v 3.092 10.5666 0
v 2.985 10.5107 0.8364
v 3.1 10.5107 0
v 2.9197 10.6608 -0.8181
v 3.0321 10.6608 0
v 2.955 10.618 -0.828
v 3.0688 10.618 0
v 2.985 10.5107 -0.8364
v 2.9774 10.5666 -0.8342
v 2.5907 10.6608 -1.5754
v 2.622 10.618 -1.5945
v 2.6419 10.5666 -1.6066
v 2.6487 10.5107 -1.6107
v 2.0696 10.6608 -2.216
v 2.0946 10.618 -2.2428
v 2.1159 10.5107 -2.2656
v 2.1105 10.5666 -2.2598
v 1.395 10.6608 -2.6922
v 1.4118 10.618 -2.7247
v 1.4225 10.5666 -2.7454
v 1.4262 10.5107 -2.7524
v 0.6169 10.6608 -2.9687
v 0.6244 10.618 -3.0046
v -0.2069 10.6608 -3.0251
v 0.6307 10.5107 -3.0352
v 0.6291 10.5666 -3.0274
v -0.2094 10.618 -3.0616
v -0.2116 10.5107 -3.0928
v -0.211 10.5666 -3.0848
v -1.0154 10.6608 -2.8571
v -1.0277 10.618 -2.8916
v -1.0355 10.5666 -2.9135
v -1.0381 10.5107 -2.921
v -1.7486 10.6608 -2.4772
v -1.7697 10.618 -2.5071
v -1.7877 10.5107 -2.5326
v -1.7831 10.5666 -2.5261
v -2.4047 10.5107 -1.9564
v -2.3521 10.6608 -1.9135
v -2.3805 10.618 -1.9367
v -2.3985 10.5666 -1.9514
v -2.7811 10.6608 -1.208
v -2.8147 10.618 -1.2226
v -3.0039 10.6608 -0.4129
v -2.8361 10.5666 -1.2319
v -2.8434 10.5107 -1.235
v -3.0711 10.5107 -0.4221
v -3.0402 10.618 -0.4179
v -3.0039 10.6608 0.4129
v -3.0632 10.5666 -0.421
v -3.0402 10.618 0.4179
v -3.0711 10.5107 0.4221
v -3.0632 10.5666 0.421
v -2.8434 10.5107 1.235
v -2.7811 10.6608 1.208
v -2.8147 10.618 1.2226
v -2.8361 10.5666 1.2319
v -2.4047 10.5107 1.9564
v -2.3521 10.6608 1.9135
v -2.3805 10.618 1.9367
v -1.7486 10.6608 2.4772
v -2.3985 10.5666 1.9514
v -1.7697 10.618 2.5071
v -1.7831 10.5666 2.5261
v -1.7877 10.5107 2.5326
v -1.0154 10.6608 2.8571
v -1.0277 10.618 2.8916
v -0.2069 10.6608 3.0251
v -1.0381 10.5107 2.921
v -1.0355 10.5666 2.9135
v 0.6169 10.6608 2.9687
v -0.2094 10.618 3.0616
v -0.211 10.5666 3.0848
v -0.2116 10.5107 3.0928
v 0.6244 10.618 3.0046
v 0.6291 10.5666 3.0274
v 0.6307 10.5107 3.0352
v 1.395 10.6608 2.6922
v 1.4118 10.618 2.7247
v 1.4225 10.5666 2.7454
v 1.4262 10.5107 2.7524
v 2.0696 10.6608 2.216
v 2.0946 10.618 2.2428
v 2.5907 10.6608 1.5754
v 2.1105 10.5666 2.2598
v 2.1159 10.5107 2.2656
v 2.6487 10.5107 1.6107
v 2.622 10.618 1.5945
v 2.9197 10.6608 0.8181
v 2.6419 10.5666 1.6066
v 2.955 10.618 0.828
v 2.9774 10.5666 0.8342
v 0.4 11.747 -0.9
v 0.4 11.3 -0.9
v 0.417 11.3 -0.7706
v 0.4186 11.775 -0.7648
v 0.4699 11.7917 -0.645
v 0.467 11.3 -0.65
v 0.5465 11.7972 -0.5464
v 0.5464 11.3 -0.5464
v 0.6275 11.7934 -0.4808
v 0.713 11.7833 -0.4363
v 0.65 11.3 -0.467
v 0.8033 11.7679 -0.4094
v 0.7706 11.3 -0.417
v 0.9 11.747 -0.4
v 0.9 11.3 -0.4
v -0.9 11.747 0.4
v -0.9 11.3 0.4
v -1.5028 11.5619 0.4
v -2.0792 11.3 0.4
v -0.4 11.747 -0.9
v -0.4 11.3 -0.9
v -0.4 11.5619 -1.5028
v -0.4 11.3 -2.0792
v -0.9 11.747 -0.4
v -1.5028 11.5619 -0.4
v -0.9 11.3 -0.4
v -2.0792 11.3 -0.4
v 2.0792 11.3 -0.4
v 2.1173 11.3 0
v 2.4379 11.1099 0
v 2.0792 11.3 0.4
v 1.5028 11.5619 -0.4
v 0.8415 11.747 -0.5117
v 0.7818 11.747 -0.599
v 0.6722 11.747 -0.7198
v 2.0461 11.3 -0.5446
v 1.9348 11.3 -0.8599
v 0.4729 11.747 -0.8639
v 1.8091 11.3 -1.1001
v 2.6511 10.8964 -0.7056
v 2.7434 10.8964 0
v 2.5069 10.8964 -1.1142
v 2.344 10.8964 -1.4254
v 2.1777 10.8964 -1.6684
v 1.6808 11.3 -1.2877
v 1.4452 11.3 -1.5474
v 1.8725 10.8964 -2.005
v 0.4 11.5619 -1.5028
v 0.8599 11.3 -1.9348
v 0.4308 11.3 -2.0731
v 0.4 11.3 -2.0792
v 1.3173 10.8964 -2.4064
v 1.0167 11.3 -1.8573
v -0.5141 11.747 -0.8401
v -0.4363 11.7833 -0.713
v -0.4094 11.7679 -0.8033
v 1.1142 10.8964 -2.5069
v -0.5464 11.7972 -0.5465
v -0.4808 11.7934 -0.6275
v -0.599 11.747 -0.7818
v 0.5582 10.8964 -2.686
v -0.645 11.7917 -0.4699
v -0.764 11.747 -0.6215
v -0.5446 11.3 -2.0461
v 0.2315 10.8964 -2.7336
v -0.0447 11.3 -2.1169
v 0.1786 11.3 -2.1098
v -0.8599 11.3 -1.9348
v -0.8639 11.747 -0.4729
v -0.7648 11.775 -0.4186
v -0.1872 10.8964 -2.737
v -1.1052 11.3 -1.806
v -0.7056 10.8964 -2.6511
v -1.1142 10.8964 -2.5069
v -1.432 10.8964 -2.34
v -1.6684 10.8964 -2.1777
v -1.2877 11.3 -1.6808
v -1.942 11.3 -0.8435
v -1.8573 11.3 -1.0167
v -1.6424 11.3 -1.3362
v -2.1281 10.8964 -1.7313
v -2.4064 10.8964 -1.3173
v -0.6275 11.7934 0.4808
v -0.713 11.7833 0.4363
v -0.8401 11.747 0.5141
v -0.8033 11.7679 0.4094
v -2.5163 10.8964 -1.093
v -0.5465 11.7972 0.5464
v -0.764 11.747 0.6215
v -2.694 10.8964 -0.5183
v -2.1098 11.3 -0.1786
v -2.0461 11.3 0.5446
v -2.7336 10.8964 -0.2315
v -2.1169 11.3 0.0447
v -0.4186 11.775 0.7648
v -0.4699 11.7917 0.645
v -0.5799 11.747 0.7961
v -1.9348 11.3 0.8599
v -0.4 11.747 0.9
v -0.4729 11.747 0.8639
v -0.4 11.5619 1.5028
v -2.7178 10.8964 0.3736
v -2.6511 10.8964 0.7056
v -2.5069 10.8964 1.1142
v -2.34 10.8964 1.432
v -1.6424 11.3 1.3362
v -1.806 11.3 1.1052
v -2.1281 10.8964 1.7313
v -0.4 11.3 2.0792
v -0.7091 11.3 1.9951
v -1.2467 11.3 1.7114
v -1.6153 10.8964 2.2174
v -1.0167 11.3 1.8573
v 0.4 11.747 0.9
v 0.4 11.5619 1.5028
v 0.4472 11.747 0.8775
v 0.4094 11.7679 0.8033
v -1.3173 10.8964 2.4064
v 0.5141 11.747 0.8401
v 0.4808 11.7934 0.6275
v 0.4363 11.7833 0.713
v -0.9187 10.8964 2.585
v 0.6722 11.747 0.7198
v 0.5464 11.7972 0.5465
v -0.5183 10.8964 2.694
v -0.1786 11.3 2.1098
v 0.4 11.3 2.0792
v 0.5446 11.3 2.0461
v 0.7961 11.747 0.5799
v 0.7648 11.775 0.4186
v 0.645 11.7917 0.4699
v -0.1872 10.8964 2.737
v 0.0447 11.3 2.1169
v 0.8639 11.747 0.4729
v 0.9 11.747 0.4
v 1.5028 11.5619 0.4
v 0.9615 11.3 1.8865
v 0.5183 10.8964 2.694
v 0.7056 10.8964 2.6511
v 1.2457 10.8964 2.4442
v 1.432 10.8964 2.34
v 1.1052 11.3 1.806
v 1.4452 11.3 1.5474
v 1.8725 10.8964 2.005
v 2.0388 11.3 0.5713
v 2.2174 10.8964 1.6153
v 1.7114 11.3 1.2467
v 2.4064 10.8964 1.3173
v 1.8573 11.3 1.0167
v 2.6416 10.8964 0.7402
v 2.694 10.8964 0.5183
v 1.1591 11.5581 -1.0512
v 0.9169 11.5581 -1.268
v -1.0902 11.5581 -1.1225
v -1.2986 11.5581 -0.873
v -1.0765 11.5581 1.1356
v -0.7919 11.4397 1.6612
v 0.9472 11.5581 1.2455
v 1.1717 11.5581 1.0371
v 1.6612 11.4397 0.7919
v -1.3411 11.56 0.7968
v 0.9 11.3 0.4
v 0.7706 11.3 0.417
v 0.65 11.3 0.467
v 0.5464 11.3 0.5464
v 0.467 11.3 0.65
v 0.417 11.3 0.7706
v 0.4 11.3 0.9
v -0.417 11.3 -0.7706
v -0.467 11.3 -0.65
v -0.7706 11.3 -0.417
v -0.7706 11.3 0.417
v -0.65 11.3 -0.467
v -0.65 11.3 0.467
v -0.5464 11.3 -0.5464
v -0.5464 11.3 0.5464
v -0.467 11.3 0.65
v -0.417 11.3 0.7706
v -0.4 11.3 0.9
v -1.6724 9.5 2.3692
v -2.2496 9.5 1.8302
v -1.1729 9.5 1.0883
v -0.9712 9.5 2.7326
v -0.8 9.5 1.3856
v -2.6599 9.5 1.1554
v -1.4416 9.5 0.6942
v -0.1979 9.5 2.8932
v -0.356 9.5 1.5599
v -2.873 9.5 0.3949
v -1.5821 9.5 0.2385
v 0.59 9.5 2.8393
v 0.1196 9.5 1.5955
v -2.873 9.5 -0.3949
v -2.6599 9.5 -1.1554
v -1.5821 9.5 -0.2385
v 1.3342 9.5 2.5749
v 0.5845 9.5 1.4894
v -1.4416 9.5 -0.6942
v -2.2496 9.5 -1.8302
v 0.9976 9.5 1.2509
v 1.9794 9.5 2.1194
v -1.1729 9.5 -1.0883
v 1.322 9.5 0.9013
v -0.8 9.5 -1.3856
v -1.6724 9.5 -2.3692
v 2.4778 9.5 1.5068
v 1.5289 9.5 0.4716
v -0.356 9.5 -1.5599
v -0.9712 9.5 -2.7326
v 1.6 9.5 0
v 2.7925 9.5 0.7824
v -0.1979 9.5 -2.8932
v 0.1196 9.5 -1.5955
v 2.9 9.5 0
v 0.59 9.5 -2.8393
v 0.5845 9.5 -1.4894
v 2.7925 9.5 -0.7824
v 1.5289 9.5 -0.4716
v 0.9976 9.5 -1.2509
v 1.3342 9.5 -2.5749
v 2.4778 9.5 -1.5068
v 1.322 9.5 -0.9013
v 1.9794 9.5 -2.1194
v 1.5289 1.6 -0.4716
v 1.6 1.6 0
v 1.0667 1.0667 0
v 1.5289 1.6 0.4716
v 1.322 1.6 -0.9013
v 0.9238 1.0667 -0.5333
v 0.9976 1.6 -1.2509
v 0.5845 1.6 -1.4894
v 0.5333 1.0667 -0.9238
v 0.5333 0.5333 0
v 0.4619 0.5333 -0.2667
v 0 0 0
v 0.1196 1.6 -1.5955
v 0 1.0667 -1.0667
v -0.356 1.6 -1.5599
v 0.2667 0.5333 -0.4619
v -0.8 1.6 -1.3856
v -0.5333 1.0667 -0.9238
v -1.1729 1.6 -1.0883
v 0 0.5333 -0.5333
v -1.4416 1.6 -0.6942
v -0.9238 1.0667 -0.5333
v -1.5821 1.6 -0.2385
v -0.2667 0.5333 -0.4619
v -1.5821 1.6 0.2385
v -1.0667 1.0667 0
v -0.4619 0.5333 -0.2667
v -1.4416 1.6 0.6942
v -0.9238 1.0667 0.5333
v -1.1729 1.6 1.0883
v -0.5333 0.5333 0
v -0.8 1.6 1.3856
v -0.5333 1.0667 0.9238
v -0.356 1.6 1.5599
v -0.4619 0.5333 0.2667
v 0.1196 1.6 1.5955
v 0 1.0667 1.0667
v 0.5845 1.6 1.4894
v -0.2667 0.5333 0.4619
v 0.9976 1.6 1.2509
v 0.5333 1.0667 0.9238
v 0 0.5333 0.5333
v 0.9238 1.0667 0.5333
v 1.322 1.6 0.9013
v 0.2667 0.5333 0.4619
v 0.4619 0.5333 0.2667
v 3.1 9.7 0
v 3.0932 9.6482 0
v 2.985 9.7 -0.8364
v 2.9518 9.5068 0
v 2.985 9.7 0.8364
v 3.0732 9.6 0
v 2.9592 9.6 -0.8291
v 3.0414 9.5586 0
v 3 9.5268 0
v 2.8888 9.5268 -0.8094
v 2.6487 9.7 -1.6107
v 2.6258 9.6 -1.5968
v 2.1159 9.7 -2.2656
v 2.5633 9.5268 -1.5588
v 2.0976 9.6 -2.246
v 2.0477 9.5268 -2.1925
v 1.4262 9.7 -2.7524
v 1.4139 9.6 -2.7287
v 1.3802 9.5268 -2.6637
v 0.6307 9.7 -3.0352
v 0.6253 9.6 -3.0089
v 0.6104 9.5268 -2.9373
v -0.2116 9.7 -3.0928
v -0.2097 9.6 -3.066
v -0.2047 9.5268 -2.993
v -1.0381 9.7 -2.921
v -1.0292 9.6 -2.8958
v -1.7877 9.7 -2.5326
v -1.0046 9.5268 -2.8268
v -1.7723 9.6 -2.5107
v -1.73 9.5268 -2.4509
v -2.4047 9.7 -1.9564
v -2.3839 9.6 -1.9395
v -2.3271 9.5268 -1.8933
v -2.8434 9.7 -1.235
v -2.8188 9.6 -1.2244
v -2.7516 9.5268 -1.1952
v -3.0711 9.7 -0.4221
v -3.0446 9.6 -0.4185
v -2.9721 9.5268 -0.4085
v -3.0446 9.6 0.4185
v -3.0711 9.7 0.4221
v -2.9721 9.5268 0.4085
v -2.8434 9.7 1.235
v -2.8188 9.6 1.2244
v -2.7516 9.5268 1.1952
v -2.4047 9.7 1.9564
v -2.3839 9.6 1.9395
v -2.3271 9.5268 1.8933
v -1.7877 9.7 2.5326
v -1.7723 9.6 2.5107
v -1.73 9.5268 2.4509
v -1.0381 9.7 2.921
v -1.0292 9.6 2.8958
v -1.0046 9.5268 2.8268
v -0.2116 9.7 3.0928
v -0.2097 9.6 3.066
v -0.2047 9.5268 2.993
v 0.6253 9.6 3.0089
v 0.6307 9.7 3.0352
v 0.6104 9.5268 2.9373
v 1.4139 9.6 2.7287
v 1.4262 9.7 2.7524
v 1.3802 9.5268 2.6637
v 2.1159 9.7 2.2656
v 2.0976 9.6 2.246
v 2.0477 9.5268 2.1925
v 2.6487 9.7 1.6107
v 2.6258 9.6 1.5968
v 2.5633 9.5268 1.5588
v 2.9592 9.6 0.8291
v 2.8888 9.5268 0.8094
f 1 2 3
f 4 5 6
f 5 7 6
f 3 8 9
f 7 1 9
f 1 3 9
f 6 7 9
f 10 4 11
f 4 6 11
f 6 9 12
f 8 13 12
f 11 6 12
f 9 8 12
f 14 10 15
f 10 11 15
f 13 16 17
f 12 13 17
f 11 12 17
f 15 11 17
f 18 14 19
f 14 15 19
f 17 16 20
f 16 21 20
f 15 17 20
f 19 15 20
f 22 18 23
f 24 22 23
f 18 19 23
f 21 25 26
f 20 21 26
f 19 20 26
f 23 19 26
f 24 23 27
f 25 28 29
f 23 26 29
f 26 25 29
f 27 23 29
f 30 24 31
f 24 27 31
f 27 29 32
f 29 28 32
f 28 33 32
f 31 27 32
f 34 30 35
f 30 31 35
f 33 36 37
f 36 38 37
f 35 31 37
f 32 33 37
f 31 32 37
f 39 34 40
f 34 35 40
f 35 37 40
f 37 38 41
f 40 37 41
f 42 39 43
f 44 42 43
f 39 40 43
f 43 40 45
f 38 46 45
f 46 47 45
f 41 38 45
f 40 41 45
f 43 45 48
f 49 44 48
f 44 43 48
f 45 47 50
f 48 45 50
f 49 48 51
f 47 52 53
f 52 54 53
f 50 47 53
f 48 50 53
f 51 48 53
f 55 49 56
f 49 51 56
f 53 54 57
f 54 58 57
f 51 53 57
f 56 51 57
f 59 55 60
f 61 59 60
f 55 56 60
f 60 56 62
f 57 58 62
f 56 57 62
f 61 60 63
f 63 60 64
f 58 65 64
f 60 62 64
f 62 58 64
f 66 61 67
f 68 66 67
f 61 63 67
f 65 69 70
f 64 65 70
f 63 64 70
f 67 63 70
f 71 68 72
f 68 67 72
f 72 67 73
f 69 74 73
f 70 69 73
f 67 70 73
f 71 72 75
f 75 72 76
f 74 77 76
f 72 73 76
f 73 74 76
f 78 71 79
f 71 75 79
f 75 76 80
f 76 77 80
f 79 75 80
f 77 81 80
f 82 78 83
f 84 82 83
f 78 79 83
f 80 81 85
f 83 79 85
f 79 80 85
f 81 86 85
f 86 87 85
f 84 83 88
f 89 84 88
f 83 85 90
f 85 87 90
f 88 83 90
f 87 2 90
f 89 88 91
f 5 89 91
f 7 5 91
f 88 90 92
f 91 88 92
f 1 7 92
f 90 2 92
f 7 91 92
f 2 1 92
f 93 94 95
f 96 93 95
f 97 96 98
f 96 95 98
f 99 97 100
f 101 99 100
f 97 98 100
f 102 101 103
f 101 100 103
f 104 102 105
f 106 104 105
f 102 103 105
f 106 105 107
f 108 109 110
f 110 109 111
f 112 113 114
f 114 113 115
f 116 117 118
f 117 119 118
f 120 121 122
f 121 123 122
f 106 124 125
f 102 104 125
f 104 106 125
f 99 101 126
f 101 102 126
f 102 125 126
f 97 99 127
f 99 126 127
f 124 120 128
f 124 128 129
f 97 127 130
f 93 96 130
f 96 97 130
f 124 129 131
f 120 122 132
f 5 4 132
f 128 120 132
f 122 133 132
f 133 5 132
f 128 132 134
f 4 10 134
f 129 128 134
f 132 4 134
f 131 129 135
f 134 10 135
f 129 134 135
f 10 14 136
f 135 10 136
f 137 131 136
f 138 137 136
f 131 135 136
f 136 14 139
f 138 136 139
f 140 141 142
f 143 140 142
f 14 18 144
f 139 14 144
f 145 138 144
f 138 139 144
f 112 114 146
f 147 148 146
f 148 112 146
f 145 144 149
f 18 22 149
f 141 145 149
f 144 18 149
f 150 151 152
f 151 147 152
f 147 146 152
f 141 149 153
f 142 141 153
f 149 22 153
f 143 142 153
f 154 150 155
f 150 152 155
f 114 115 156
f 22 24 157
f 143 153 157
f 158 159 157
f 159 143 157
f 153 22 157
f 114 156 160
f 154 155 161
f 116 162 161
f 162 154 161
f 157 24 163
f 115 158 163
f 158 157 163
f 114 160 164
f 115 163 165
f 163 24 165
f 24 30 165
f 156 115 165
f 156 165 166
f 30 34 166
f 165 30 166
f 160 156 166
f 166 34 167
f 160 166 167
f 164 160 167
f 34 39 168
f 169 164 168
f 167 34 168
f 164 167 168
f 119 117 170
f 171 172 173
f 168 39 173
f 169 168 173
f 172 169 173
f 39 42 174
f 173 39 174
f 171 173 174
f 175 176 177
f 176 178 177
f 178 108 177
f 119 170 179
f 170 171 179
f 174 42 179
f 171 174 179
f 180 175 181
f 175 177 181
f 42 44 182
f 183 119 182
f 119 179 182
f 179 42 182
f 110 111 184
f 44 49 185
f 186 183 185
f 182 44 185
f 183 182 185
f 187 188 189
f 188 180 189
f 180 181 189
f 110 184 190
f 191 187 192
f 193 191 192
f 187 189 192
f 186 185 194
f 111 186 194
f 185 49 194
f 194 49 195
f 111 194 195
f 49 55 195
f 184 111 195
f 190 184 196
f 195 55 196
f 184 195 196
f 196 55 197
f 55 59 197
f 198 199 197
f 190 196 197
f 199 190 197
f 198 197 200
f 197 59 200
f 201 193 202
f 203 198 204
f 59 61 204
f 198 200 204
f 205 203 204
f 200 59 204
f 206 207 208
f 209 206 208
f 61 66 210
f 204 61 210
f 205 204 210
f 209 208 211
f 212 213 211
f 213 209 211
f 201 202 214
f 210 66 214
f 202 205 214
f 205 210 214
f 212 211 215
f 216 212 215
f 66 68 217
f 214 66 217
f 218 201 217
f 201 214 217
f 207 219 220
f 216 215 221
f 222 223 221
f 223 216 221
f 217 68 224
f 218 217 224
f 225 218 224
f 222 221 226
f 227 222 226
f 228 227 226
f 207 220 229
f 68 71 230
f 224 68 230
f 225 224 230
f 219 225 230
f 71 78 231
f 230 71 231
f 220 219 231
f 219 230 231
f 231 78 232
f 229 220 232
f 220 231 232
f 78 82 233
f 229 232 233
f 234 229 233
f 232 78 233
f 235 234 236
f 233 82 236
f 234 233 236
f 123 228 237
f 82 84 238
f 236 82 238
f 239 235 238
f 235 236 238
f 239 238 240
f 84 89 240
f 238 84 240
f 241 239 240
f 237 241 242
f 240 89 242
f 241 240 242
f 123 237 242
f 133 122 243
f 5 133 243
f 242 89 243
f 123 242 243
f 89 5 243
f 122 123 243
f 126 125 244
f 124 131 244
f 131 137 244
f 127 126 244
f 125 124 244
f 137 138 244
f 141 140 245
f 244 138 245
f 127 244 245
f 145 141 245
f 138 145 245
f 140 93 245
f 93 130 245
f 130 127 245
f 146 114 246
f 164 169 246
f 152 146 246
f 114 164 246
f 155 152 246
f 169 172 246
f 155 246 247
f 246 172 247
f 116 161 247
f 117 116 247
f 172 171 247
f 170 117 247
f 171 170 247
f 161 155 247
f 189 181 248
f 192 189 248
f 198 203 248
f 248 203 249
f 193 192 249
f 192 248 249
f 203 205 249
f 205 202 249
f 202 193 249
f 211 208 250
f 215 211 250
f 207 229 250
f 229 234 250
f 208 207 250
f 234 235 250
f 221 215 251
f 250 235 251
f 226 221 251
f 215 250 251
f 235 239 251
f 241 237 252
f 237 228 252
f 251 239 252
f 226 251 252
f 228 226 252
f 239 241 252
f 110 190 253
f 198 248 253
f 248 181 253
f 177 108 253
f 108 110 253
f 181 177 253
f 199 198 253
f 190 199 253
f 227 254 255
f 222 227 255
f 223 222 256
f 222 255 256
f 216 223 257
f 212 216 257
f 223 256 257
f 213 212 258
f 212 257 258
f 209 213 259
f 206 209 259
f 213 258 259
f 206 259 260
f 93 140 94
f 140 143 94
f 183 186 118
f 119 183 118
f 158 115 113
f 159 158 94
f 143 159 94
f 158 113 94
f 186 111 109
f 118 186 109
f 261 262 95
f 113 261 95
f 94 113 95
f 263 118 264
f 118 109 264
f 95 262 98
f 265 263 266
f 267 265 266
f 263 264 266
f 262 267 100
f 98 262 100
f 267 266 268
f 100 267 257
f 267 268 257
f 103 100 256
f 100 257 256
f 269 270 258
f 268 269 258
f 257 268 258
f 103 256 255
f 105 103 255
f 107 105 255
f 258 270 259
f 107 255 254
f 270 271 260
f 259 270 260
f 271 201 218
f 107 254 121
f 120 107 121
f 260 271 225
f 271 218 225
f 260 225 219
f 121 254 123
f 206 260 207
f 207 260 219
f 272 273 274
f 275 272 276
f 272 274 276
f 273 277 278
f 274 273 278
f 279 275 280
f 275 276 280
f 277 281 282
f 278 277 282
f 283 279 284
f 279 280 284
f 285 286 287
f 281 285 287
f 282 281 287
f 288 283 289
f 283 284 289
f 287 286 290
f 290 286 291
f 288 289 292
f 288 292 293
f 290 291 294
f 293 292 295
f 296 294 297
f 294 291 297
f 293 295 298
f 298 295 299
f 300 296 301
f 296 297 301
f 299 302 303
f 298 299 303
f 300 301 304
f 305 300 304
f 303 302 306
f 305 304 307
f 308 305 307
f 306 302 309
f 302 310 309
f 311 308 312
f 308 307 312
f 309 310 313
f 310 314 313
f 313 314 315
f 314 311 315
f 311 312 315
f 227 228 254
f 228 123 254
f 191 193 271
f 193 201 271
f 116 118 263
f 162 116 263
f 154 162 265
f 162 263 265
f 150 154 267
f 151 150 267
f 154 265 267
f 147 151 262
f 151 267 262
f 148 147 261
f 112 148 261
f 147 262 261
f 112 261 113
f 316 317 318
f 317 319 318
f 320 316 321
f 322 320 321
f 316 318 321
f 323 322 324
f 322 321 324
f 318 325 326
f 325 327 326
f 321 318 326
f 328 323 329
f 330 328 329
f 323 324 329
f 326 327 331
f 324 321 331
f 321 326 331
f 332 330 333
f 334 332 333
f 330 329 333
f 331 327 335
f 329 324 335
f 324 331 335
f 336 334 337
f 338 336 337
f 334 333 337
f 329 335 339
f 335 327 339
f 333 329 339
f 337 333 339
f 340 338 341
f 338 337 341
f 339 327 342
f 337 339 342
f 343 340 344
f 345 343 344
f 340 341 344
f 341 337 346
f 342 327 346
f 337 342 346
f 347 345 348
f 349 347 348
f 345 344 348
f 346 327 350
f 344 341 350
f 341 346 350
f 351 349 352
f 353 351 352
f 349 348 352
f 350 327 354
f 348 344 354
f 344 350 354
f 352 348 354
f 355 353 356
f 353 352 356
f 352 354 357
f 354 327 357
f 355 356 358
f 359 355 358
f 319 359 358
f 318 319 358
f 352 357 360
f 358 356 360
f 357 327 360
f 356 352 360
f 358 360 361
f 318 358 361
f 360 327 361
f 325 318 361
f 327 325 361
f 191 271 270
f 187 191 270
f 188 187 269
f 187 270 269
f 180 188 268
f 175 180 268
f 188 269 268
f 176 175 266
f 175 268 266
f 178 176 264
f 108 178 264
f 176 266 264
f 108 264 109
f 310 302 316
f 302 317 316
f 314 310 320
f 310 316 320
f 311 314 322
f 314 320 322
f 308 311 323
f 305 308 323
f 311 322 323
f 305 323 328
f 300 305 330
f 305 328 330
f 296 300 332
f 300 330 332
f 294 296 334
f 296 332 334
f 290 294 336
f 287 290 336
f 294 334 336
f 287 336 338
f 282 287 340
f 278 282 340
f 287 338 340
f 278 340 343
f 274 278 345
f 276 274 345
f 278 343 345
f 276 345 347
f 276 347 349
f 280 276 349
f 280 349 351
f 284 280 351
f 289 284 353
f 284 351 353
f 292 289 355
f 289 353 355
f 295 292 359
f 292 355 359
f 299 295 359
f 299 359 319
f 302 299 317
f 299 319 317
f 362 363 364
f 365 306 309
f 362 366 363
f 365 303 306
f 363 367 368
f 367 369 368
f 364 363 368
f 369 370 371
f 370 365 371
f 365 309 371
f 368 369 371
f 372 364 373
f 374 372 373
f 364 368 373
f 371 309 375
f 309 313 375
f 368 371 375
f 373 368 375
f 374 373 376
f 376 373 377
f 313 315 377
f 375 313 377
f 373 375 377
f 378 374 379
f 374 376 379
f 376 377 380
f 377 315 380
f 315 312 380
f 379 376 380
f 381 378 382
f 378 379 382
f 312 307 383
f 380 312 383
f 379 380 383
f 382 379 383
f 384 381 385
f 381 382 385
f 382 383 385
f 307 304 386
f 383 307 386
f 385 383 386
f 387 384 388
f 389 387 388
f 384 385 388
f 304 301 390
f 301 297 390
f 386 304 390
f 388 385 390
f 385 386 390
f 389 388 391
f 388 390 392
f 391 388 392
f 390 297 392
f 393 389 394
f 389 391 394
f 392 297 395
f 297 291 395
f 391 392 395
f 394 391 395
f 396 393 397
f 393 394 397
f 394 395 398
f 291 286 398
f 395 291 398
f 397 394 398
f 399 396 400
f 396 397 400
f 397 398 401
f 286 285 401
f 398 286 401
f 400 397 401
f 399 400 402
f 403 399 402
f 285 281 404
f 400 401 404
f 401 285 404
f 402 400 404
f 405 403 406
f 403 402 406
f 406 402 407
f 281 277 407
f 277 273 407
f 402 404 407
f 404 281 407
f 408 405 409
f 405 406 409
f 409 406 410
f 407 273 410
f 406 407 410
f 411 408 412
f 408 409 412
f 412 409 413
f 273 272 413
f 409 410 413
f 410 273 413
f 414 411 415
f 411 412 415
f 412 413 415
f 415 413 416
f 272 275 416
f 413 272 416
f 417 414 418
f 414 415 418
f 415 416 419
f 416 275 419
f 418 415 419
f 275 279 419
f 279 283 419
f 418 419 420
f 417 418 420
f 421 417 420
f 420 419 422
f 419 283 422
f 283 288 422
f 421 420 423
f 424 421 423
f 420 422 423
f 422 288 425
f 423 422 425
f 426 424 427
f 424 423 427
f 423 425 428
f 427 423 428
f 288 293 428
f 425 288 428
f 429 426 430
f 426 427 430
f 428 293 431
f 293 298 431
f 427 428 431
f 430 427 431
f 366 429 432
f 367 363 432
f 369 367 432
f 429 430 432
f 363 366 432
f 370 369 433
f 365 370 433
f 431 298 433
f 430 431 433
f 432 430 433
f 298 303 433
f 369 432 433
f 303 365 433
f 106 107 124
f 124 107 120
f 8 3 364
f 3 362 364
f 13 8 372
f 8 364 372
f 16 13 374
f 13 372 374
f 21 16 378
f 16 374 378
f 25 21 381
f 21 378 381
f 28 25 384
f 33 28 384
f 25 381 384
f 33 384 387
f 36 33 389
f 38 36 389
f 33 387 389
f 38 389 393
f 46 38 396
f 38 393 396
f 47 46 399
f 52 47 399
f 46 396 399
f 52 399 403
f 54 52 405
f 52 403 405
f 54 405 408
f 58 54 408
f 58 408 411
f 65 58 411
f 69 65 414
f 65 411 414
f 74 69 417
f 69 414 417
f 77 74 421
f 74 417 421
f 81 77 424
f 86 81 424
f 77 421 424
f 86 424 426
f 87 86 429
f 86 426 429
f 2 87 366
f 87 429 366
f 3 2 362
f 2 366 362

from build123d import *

# Parameters (mm, degrees)
CORTAR_EXTRUIR1_START = -1.8
CORTAR_EXTRUIR1_DEPTH = 3


with BuildPart() as part:
    # Croquis1 → Revolución1 (revolve)
    with BuildSketch(Plane.XY):
        with BuildLine():
            Line((0, 0), (0, 11.9))
            ThreePointArc((0, 11.9), (1.620417383, 11.535759883), (3.032129542, 10.660835807))
            ThreePointArc((3.032129542, 10.660835807), (3.082244216, 10.59308012), (3.1, 10.510696592))
            Line((3.1, 10.510696592), (3.1, 9.7))
            ThreePointArc((3.1, 9.7), (3.041421356, 9.558578644), (2.9, 9.5))
            Line((2.9, 9.5), (1.6, 9.5))
            Line((1.6, 9.5), (1.6, 1.6))
            Line((1.6, 1.6), (0, 0))
        make_face()
    revolve(axis=Axis((0, 0, 0), (0, 1, 0)))

    # Croquis2 → Cortar-Extruir1 (cut)
    with BuildSketch(Plane.XZ.offset(-9.5).offset(CORTAR_EXTRUIR1_START)):
        with BuildLine():
            Line((-0.4, 3.2), (-0.4, 0.9))
            ThreePointArc((-0.4, 0.9), (-0.546446609, 0.546446609), (-0.9, 0.4))
            Line((-0.9, 0.4), (-3.2, 0.4))
            Line((-3.2, 0.4), (-3.2, -0.4))
            Line((-3.2, -0.4), (-0.9, -0.4))
            ThreePointArc((-0.9, -0.4), (-0.546446609, -0.546446609), (-0.4, -0.9))
            Line((-0.4, -0.9), (-0.4, -3.2))
            Line((-0.4, -3.2), (0.4, -3.2))
            Line((0.4, -3.2), (0.4, -0.9))
            ThreePointArc((0.4, -0.9), (0.546446609, -0.546446609), (0.9, -0.4))
            Line((0.9, -0.4), (3.2, -0.4))
            Line((3.2, -0.4), (3.2, 0.4))
            Line((3.2, 0.4), (0.9, 0.4))
            ThreePointArc((0.9, 0.4), (0.546446609, 0.546446609), (0.4, 0.9))
            Line((0.4, 0.9), (0.4, 3.2))
            Line((0.4, 3.2), (-0.4, 3.2))
        make_face()
    extrude(amount=-CORTAR_EXTRUIR1_DEPTH, mode=Mode.SUBTRACT)


solid = part.part
